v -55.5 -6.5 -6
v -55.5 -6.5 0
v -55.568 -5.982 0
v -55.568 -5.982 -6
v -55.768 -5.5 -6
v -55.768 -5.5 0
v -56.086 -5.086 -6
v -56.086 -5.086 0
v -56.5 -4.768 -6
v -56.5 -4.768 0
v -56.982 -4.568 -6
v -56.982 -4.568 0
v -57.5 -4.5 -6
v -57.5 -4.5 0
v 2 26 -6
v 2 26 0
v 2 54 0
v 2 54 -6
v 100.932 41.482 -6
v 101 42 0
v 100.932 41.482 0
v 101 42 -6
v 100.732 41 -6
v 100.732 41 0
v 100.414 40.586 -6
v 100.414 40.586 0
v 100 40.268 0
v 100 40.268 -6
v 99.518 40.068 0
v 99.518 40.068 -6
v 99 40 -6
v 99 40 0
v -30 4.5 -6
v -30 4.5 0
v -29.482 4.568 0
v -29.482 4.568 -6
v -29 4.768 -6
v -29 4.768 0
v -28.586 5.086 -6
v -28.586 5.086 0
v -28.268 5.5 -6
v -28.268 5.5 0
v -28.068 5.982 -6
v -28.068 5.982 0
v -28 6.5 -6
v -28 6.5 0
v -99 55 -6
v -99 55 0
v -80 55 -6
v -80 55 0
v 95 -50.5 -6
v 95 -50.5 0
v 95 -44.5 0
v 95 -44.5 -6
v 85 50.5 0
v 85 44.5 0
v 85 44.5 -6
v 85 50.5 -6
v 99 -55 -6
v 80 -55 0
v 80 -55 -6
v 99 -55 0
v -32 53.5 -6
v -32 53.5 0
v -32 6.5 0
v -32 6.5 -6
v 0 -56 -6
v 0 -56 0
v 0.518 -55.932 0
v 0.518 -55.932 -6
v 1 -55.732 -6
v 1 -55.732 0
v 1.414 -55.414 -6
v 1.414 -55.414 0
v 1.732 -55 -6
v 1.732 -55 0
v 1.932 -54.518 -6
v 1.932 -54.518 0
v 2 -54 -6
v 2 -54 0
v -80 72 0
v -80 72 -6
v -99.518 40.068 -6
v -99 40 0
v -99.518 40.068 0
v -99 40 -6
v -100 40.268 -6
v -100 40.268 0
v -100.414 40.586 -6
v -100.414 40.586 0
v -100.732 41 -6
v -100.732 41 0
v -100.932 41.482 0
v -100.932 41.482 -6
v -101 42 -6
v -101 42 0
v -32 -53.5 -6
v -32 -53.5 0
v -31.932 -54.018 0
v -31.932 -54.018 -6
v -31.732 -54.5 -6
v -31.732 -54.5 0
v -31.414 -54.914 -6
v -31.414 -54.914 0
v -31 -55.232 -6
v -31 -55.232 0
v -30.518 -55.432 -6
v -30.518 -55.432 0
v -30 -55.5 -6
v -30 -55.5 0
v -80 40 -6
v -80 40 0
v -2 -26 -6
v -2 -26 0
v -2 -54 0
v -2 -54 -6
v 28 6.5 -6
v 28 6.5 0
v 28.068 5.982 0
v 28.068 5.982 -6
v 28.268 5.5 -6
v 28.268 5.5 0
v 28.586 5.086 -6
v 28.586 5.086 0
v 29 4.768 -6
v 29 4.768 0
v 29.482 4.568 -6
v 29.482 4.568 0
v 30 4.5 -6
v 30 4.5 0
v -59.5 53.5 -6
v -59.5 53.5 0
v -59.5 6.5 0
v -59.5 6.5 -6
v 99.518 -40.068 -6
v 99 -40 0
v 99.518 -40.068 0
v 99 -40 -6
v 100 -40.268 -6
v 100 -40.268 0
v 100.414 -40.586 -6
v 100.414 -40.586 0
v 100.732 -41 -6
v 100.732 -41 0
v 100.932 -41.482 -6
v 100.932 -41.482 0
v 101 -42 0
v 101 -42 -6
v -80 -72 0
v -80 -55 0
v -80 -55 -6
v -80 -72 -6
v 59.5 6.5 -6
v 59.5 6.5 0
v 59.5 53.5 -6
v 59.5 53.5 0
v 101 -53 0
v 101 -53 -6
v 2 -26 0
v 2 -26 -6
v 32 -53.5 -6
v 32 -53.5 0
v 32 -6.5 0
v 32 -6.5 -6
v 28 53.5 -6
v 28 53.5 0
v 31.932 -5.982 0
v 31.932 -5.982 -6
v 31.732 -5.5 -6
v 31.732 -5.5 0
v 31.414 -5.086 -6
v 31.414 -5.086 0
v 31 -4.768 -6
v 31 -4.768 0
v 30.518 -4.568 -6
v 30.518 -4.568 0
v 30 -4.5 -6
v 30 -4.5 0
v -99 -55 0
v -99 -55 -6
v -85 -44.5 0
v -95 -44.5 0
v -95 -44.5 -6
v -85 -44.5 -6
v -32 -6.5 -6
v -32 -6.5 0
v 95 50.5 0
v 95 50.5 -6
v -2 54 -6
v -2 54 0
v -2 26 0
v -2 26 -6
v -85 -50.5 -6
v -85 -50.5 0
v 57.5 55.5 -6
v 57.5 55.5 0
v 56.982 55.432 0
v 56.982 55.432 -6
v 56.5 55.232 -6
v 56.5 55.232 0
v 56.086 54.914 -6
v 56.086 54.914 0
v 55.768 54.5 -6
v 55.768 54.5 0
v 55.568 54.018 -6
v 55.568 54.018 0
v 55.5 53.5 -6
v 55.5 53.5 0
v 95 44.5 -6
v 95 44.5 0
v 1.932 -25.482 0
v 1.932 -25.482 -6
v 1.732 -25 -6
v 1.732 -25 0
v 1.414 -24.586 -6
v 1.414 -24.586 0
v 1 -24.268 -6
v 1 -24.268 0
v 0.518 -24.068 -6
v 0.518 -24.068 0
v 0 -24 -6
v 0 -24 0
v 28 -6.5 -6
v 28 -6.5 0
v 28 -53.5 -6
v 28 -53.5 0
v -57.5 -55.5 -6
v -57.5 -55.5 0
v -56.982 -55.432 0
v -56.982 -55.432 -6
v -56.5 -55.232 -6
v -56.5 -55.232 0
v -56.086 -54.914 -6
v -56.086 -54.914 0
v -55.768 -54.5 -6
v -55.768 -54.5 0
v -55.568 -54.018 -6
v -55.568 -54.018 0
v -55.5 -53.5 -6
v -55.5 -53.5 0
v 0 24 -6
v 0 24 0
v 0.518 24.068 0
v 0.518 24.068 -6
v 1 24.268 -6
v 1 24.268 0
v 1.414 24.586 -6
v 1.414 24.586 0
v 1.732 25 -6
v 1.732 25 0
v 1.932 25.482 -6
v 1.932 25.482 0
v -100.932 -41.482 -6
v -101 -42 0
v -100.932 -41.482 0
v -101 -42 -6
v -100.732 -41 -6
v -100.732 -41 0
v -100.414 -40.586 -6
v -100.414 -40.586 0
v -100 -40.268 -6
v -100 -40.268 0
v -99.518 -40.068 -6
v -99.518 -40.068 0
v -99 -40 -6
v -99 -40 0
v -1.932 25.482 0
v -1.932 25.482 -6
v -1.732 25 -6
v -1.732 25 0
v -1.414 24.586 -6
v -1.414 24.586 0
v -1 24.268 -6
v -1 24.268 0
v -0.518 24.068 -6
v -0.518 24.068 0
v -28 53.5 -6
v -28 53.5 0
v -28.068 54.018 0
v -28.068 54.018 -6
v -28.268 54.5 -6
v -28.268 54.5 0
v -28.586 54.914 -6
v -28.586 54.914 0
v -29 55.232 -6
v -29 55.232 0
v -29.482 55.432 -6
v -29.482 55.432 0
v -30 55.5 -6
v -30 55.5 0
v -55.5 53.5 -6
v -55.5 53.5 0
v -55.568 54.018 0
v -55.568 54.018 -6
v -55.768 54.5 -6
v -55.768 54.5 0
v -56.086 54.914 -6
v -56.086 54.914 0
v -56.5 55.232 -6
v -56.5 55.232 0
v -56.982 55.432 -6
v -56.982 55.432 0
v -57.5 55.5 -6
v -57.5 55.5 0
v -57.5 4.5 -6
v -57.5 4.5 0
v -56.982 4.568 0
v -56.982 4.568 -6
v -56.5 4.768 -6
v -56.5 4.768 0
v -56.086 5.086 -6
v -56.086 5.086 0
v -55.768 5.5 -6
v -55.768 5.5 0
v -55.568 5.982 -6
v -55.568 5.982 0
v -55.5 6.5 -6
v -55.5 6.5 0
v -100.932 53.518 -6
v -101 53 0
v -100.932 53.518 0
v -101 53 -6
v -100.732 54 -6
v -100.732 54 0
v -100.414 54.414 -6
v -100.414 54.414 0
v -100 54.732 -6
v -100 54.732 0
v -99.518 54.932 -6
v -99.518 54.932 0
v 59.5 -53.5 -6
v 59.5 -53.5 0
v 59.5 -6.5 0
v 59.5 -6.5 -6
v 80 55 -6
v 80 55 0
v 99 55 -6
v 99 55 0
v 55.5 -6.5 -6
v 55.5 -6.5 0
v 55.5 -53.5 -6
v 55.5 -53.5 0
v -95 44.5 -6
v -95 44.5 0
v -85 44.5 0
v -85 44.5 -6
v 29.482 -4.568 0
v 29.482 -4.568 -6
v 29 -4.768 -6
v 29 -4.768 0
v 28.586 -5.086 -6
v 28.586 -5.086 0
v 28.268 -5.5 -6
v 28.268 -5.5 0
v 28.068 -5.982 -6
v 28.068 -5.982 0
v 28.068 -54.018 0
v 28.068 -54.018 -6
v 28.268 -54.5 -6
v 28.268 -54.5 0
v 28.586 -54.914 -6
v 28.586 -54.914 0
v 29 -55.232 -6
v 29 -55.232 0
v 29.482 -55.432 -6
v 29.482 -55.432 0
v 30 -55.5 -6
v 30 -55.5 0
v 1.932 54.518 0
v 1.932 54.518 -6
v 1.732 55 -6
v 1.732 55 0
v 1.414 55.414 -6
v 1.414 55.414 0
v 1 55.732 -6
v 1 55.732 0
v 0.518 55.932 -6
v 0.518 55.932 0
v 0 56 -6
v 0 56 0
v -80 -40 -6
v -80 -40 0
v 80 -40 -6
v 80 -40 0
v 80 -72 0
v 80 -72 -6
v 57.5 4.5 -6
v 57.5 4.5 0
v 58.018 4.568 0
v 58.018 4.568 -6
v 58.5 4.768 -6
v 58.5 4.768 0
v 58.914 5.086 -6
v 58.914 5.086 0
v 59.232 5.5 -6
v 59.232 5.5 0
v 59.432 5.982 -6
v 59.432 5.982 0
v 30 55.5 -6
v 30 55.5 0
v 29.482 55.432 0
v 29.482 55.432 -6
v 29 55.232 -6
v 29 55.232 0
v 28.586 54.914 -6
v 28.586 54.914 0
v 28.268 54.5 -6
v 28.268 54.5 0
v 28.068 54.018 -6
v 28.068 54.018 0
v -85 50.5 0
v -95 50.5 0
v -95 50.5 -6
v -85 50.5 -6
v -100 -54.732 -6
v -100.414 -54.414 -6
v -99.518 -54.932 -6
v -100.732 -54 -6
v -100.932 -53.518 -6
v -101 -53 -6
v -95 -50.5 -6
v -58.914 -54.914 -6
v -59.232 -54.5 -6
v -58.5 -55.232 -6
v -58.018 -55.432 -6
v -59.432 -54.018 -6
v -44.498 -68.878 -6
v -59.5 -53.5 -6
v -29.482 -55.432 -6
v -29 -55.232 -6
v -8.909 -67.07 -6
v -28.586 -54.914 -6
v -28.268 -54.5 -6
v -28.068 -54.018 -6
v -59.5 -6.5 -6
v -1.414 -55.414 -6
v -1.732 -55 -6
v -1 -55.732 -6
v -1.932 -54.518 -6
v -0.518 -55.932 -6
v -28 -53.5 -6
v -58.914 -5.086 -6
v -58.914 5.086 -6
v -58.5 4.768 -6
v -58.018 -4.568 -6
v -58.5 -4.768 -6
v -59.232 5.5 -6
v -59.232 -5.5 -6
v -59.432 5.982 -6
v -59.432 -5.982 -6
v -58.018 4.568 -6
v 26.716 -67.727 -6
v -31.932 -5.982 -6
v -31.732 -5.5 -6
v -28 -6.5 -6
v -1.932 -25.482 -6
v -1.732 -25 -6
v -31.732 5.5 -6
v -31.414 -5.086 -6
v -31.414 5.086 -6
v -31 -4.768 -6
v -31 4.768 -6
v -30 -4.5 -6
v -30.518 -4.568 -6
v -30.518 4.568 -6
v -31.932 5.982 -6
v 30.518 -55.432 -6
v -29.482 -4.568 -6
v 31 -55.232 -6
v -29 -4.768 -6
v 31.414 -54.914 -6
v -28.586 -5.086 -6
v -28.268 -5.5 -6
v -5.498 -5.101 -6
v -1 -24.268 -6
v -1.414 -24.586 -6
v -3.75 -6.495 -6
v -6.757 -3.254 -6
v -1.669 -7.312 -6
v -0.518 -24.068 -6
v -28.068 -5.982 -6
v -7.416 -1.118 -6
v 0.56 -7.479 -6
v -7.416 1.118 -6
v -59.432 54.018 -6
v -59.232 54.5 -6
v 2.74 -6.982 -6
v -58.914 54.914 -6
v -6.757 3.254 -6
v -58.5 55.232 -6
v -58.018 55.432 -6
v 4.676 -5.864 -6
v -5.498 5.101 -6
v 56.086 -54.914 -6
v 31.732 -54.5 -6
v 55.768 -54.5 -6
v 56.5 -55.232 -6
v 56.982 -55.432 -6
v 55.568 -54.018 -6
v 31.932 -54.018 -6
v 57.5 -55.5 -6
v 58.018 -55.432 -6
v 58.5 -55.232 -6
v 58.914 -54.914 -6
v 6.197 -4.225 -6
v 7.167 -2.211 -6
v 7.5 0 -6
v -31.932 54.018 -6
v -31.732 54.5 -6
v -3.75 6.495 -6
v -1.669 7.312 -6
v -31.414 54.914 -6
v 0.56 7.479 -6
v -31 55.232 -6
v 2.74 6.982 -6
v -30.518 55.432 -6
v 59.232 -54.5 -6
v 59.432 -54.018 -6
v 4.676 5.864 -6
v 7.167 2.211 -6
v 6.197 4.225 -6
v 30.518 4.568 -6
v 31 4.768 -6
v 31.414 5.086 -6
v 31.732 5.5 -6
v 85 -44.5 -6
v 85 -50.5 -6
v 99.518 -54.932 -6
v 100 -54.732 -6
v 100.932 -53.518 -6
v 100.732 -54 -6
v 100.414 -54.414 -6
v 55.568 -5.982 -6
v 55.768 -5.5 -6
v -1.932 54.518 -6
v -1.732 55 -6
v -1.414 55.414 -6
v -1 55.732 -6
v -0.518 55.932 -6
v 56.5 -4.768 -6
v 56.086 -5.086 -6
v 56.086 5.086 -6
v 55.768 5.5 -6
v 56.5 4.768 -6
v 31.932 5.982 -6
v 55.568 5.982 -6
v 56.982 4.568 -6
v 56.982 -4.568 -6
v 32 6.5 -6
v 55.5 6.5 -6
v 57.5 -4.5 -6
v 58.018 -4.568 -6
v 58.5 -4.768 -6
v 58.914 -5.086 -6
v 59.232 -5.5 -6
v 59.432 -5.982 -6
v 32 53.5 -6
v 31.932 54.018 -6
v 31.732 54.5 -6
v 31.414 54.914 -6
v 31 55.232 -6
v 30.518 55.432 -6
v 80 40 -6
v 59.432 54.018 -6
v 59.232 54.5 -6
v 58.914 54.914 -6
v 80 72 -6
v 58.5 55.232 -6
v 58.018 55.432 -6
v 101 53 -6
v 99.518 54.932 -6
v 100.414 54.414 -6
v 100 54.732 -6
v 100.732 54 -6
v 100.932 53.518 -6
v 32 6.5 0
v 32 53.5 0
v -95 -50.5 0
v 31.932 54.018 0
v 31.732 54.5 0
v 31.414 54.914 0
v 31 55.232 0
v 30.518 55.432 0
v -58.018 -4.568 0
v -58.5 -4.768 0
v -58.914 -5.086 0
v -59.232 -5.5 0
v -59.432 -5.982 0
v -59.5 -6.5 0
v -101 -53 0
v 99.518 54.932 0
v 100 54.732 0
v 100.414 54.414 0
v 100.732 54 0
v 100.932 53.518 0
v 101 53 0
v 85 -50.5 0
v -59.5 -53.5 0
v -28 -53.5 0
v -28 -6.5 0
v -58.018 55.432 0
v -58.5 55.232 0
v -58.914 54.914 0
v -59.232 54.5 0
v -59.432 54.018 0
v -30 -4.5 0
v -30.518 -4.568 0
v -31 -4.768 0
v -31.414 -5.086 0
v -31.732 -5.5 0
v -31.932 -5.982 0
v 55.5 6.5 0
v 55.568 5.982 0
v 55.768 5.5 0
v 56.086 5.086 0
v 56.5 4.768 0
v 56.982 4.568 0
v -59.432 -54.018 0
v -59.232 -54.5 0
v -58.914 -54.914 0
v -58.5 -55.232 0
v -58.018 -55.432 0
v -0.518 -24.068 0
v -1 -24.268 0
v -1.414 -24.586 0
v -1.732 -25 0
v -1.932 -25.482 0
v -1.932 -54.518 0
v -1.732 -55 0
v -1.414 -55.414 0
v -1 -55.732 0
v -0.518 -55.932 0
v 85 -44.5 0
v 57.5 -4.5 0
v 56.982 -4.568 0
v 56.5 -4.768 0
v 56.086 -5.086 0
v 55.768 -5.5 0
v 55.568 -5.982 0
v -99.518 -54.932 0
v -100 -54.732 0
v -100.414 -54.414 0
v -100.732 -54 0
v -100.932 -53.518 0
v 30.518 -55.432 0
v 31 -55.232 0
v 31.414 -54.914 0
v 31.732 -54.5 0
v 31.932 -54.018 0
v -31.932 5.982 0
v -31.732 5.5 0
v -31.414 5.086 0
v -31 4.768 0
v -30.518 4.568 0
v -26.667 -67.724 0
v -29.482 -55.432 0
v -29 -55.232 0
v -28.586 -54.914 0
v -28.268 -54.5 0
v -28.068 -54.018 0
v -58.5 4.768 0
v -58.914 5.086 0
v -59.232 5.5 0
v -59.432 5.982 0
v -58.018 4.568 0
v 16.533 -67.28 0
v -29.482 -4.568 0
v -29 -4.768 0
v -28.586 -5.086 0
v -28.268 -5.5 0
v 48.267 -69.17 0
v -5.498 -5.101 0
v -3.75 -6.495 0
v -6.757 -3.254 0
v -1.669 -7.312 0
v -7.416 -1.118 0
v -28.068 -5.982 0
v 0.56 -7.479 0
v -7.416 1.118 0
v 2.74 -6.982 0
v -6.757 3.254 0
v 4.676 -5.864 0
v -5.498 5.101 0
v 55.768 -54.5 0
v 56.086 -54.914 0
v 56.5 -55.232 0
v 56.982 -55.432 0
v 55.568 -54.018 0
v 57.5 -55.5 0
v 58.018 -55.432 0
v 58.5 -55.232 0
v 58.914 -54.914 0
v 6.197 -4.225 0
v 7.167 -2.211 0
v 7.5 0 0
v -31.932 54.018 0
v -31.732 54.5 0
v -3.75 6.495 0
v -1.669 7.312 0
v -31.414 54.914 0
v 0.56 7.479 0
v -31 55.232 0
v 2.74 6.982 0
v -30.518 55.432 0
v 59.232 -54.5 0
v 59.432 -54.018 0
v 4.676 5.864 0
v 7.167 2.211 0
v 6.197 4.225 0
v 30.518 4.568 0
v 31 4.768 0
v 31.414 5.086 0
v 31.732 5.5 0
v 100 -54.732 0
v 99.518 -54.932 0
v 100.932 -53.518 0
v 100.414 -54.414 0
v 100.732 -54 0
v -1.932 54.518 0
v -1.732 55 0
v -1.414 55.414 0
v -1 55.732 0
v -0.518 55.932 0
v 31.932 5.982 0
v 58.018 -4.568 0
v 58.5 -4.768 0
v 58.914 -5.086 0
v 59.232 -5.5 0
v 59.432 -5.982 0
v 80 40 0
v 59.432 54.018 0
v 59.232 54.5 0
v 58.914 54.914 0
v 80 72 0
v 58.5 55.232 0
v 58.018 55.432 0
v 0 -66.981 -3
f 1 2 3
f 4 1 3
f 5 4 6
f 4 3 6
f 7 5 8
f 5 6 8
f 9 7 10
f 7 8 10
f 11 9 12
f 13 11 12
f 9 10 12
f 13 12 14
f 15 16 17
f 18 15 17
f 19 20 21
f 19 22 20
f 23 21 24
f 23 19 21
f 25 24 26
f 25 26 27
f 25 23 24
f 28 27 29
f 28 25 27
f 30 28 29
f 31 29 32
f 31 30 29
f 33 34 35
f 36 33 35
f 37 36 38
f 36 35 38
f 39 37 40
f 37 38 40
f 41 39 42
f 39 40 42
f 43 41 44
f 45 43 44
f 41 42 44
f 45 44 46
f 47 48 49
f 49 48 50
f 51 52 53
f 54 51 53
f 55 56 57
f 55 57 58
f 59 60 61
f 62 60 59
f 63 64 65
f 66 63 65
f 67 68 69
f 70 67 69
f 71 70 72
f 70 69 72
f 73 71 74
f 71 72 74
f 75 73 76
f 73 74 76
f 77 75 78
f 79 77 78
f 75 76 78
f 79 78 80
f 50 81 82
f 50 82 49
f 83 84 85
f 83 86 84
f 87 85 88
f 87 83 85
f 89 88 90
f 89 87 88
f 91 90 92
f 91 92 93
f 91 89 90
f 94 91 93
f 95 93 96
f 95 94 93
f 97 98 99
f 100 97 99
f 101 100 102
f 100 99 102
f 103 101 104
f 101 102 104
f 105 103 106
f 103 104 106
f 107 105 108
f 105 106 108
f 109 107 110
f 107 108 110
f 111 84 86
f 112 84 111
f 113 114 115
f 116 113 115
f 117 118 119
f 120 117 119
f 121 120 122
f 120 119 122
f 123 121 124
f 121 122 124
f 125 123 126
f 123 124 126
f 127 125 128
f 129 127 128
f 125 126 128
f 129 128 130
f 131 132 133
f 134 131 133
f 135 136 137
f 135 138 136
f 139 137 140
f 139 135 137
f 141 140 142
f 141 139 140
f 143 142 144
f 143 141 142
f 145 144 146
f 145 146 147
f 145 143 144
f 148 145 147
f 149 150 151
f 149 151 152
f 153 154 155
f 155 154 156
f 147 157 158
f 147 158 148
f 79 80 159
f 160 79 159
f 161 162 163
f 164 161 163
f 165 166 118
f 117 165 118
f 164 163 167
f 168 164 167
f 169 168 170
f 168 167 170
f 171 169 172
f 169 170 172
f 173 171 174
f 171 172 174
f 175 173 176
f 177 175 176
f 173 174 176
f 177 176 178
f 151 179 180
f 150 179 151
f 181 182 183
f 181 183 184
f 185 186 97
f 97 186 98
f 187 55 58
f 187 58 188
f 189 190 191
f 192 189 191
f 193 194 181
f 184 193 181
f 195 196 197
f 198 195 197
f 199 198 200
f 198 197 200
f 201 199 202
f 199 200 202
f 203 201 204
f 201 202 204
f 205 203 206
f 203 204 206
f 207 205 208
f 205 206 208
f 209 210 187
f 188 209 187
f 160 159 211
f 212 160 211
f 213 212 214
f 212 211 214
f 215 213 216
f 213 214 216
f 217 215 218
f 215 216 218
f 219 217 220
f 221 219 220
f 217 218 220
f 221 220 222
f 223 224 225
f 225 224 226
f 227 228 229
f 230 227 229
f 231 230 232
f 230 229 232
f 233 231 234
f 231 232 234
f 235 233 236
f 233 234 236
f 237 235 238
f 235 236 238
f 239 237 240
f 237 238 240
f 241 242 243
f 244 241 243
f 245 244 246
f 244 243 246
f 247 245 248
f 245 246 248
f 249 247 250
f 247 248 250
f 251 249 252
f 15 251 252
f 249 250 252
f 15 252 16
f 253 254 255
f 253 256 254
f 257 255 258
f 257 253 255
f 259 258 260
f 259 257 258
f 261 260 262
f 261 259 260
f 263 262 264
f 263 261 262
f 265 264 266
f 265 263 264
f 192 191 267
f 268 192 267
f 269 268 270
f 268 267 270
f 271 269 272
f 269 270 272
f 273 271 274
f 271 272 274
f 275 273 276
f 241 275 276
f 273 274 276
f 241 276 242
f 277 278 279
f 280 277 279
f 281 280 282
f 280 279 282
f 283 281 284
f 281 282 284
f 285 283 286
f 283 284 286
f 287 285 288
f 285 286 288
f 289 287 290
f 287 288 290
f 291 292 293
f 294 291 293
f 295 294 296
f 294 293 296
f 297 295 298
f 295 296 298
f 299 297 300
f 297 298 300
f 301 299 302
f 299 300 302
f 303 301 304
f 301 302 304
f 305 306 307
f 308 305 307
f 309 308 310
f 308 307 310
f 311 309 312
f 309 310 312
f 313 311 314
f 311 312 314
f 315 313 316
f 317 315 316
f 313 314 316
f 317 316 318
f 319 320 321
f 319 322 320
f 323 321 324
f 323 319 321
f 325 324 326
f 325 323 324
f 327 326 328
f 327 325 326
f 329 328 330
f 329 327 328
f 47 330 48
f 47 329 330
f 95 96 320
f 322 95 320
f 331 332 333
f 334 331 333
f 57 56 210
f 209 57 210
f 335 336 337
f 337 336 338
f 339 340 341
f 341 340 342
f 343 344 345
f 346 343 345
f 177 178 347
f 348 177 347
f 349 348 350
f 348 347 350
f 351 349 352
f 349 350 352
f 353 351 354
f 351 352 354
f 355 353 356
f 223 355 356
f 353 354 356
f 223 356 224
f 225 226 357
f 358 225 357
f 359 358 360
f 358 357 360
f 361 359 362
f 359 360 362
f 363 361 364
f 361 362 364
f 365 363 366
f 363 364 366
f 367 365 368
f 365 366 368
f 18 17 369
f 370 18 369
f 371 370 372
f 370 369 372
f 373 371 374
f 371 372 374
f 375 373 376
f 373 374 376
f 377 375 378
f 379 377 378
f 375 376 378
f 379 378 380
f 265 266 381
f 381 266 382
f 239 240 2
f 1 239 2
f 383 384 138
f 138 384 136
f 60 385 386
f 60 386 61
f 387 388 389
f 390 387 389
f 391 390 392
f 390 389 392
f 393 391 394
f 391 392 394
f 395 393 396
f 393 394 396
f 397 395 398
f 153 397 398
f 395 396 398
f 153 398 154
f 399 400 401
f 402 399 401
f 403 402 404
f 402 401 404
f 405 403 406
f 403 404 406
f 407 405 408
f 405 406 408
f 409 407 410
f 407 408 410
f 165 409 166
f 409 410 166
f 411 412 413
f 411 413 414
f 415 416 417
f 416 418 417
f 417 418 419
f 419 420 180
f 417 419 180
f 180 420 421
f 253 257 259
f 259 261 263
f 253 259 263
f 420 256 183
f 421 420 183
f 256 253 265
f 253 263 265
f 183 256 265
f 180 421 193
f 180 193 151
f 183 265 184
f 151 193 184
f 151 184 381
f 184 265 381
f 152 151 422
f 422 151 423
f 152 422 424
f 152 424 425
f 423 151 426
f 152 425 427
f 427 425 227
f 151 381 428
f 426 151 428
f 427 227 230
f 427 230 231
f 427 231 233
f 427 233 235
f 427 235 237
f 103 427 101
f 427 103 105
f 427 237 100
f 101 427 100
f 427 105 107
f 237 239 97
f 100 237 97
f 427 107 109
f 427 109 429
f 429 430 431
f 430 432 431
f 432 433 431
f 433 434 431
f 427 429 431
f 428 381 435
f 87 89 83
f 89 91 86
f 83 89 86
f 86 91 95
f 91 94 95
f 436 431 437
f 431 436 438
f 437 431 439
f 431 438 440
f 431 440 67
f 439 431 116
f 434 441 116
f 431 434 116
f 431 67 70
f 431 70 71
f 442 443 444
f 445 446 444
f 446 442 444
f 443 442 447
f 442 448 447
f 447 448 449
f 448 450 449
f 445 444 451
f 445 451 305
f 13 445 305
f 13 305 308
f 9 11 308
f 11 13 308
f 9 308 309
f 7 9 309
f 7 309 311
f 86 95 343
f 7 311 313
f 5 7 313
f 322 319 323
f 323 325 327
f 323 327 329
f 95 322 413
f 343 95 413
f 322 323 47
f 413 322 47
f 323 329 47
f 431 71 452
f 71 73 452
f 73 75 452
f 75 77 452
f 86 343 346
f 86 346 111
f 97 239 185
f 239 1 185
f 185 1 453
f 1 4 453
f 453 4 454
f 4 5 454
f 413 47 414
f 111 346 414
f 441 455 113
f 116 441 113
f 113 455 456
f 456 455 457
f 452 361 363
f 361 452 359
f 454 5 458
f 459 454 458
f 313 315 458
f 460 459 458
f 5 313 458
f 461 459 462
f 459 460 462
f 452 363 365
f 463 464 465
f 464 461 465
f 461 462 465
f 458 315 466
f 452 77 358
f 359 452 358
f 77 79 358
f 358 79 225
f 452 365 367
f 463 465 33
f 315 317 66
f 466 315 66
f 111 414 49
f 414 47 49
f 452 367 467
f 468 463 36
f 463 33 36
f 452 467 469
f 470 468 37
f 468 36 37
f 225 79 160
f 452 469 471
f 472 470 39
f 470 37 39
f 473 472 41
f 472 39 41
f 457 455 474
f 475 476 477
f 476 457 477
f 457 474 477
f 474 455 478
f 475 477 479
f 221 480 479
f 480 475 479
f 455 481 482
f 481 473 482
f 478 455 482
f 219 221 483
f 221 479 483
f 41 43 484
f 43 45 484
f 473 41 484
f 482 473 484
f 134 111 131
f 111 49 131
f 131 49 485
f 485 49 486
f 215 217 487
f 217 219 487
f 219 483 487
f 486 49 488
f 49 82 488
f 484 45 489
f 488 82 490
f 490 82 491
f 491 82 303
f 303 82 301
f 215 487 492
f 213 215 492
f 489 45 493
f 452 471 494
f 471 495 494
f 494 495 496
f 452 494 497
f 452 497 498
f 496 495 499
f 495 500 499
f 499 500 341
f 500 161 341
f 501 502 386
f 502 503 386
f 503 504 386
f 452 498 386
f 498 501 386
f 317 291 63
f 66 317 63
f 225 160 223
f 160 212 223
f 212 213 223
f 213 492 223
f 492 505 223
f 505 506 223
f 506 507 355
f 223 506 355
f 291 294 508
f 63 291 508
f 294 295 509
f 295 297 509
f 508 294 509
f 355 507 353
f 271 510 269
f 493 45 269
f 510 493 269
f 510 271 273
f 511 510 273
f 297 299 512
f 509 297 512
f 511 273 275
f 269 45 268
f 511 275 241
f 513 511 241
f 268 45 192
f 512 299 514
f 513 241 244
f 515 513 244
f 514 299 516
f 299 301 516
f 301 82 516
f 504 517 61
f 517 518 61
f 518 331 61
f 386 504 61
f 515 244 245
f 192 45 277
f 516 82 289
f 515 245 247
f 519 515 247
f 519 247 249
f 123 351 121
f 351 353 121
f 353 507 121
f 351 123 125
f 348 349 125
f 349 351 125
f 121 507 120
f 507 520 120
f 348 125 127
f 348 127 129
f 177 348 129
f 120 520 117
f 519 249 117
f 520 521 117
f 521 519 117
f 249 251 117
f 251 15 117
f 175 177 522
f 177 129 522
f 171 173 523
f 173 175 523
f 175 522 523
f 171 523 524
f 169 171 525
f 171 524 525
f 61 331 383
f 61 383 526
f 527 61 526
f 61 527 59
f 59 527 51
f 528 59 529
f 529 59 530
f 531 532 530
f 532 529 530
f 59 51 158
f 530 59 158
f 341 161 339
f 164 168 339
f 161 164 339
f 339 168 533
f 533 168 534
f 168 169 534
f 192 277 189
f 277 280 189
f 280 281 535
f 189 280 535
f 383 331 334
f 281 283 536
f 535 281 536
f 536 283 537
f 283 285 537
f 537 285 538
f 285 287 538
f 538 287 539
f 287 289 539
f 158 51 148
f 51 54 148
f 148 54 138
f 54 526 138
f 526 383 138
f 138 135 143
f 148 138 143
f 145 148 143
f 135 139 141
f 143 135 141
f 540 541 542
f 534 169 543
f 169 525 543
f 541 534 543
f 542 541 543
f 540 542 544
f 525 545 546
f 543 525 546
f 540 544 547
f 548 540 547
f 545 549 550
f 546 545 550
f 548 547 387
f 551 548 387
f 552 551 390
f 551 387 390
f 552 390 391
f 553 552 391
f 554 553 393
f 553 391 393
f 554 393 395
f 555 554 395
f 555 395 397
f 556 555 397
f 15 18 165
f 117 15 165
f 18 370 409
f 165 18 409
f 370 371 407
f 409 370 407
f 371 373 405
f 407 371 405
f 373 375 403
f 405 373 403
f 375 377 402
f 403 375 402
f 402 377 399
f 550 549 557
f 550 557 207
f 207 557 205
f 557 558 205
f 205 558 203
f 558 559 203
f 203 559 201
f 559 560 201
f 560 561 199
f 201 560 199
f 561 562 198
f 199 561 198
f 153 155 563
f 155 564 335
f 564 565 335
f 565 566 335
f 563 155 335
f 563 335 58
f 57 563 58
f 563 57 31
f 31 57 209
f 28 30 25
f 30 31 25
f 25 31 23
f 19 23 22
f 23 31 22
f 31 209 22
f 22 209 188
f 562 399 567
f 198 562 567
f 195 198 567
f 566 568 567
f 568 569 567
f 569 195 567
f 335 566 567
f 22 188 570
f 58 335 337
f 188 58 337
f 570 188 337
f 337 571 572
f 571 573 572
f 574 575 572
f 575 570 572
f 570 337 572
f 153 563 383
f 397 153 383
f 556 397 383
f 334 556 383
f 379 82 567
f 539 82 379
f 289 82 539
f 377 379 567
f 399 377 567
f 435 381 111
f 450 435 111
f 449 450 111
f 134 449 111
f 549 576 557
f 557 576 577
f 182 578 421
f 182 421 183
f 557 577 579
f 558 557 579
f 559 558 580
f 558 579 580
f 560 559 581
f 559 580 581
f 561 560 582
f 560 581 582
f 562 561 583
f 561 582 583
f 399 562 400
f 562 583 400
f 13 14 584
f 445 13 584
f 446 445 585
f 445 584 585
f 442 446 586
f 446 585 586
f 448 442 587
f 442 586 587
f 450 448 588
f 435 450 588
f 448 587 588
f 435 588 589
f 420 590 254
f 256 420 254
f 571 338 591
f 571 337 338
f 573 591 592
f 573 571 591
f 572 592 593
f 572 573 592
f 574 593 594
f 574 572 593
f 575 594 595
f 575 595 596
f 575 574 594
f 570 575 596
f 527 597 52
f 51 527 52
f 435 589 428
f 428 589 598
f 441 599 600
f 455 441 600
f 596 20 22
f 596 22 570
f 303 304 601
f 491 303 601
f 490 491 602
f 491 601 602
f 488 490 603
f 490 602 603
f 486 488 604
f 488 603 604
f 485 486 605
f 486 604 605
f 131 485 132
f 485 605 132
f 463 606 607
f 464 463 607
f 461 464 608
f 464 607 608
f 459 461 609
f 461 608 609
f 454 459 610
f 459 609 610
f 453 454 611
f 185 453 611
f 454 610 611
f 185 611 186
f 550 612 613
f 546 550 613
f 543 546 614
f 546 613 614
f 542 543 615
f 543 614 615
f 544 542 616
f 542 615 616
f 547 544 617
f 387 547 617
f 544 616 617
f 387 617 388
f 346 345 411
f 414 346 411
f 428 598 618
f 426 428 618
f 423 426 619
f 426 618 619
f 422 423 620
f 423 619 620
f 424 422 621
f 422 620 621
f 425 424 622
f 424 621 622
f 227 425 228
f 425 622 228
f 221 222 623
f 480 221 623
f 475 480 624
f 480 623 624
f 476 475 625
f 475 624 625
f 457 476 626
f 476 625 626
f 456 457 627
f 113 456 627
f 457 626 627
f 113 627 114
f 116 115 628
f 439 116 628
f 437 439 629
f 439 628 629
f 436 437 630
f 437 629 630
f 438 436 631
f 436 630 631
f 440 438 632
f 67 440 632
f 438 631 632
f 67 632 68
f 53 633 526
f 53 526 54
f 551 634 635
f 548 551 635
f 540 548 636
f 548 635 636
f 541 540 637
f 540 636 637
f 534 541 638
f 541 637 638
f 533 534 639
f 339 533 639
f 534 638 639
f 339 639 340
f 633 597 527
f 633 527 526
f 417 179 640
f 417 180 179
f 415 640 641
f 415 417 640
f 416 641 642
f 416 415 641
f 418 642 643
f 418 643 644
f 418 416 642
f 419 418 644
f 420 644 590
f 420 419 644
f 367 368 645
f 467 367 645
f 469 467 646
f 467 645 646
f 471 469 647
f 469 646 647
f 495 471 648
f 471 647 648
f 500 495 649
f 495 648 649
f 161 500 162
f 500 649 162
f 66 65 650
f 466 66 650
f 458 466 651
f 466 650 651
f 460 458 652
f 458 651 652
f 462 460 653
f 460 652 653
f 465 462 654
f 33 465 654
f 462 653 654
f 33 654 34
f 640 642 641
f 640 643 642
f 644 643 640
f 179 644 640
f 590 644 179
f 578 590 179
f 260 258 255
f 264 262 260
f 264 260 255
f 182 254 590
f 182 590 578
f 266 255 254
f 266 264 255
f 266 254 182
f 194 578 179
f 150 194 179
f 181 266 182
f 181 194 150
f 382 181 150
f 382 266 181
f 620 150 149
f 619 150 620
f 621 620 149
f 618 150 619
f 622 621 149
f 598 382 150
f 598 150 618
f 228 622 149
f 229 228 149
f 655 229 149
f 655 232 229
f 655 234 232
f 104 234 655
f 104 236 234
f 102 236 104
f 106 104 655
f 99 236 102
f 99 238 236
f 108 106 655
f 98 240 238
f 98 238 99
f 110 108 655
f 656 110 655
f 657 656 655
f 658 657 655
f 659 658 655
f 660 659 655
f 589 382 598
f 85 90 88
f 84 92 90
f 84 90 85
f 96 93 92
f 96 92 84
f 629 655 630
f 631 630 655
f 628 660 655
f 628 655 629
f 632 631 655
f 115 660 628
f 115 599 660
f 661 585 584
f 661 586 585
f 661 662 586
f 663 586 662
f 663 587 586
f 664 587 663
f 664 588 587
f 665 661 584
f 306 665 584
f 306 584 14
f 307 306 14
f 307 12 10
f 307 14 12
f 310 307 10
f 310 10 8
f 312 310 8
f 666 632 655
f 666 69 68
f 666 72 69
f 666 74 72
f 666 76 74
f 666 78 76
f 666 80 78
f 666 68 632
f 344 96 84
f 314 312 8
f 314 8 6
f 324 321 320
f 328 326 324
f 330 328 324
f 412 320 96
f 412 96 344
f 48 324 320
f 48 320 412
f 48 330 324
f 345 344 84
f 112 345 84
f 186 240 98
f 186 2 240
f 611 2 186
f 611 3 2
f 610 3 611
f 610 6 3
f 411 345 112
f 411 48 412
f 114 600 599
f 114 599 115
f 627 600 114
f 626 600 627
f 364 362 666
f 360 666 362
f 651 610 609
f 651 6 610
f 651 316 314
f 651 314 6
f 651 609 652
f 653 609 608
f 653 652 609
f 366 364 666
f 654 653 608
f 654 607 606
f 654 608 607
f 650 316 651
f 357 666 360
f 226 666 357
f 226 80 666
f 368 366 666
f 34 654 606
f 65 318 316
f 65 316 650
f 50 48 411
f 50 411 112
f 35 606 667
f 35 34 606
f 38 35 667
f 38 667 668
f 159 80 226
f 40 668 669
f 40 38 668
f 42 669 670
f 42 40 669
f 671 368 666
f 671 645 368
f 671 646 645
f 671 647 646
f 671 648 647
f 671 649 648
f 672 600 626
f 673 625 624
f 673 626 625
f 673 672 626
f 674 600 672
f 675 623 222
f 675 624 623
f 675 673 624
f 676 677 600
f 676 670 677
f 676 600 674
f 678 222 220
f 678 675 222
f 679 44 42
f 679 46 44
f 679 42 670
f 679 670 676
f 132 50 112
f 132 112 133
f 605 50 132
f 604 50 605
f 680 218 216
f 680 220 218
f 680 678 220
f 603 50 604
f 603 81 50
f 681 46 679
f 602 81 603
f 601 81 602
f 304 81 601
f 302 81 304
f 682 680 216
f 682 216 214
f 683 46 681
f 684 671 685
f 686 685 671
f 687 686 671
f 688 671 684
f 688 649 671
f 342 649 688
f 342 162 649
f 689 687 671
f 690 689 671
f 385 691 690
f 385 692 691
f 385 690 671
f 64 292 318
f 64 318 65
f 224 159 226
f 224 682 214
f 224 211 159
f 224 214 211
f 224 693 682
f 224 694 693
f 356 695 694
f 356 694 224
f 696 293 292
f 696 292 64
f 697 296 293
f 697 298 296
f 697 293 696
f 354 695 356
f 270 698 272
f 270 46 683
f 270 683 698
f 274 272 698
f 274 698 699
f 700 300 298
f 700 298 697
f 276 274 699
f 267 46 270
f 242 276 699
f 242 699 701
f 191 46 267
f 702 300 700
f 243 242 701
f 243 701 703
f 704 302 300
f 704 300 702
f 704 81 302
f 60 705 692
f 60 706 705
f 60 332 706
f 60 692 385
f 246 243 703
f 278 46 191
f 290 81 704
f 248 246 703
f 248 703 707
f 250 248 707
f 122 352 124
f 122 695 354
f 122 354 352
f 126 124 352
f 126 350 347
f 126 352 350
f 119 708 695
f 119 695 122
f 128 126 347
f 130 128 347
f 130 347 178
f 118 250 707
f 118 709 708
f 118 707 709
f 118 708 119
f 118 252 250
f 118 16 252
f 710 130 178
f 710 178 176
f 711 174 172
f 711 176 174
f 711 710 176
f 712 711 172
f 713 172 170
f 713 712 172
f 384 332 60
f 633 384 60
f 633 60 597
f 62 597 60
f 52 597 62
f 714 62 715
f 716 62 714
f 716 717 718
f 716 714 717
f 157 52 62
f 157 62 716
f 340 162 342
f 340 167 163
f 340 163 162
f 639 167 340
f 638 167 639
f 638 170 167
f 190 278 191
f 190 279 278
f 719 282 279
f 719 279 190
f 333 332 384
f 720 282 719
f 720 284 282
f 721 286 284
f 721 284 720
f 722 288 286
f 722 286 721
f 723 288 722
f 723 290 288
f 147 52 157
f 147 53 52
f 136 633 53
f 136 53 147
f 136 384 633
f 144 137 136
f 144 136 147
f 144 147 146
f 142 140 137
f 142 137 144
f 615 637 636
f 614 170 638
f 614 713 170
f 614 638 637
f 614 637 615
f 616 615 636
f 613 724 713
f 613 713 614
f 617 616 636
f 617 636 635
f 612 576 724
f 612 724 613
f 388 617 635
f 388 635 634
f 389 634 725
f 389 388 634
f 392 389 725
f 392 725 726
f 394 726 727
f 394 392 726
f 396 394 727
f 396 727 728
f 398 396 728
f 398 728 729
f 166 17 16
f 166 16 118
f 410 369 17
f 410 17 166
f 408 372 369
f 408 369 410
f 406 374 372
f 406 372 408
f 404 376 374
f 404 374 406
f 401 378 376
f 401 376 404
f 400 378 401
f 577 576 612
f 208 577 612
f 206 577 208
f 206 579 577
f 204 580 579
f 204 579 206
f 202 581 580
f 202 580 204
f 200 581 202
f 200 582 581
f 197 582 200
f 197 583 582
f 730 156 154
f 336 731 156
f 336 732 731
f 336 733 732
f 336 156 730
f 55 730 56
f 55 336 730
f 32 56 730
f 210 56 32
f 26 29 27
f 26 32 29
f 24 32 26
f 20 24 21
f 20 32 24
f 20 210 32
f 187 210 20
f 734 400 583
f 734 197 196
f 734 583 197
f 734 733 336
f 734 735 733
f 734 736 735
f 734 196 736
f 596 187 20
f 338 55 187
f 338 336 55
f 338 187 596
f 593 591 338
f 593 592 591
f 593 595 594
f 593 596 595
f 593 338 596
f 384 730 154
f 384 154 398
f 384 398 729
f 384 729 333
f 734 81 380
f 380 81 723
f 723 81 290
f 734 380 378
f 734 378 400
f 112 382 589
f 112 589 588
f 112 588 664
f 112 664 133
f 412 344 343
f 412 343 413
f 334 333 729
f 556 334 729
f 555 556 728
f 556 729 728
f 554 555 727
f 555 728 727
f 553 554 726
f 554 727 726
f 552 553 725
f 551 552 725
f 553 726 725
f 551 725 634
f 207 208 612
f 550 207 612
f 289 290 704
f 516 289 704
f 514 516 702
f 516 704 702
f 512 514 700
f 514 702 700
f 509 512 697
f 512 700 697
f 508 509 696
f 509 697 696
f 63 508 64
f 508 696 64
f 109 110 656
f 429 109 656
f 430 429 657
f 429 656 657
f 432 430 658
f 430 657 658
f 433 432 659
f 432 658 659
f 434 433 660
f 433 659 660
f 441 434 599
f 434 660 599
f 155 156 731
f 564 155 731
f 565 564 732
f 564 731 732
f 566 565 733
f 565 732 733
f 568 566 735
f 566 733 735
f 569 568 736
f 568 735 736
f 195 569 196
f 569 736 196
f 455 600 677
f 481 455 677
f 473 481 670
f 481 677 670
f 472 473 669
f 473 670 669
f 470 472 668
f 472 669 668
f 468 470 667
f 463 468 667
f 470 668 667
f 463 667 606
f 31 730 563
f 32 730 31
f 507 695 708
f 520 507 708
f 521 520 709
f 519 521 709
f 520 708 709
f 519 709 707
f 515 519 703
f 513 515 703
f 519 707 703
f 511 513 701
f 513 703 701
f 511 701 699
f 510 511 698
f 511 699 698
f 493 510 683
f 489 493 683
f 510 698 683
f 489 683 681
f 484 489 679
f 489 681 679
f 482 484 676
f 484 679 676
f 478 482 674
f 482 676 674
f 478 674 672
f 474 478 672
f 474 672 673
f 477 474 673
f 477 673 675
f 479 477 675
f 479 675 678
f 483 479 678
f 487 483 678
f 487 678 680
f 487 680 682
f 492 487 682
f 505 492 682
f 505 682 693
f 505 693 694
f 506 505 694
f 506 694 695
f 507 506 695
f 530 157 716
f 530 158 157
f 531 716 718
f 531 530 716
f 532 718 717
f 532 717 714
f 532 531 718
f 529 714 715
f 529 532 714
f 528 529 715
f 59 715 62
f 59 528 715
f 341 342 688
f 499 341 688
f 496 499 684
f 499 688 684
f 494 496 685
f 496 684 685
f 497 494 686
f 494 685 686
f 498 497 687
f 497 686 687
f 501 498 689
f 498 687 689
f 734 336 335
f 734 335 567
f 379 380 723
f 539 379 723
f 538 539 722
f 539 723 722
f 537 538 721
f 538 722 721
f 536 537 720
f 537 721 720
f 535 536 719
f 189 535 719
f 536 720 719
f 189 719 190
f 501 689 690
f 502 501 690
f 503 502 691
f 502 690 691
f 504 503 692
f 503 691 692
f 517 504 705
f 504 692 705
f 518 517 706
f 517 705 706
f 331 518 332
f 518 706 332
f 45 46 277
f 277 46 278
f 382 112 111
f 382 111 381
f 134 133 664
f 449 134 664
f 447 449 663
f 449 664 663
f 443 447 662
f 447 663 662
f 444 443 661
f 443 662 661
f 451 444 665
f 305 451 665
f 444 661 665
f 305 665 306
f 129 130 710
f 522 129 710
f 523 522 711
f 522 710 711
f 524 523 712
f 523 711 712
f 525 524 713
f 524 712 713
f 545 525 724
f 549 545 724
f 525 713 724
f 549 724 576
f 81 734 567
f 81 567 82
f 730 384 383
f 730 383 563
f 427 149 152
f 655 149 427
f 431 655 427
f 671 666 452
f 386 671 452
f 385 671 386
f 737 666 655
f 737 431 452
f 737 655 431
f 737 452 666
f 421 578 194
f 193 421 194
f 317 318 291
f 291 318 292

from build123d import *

# Parameters (mm, degrees)
F1_W     = 21
F1_H     = 15
F2_DEPTH = 6
F0_R     = 7.5
F3_DEPTH = 25
F5_DEPTH = 25
F6_R     = 2
F7_W     = 10
F7_H     = 6
F8_DEPTH = 25


with BuildPart() as f2:
    # F1 (on Top) → F2 (new body)
    with BuildSketch(Plane.XY):
        Polygon((-80, -72), (80, -72), (80, -55), (80, -40), (80, 40), (80, 55), (80, 72), (-80, 72), (-80, 55), (-80, 40), (-80, -40), (-80, -55), align=None)
        with Locations((90.5, -47.5)):
            Rectangle(F1_W, F1_H)
        with Locations((-90.5, -47.5)):
            Rectangle(F1_W, F1_H)
        with Locations((90.5, 47.5)):
            Rectangle(F1_W, F1_H)
        with Locations((-90.5, 47.5)):
            Rectangle(F1_W, F1_H)
    extrude(amount=-F2_DEPTH)

    # F0 (on Top) → F3 (cut)
    with BuildSketch(Plane.XY):
        with BuildLine():
            ThreePointArc((-57.5, 55.5), (-58.9142135624, 54.9142135624), (-59.5, 53.5))
            Line((-59.5, 53.5), (-59.5, 6.5))
            ThreePointArc((-59.5, 6.5), (-58.9142135624, 5.0857864376), (-57.5, 4.5))
            ThreePointArc((-57.5, 4.5), (-56.0857864376, 5.0857864376), (-55.5, 6.5))
            Line((-55.5, 6.5), (-55.5, 53.5))
            ThreePointArc((-55.5, 53.5), (-56.0857864376, 54.9142135624), (-57.5, 55.5))
        make_face()
        with BuildLine():
            ThreePointArc((-59.5, -53.5), (-58.9142135624, -54.9142135624), (-57.5, -55.5))
            ThreePointArc((-57.5, -55.5), (-56.0857864376, -54.9142135624), (-55.5, -53.5))
            Line((-55.5, -53.5), (-55.5, -6.5))
            ThreePointArc((-55.5, -6.5), (-56.0857864376, -5.0857864376), (-57.5, -4.5))
            ThreePointArc((-57.5, -4.5), (-58.9142135624, -5.0857864376), (-59.5, -6.5))
            Line((-59.5, -6.5), (-59.5, -53.5))
        make_face()
        with BuildLine():
            ThreePointArc((-28, 53.5), (-28.5857864376, 54.9142135624), (-30, 55.5))
            ThreePointArc((-30, 55.5), (-31.4142135624, 54.9142135624), (-32, 53.5))
            Line((-32, 53.5), (-32, 6.5))
            ThreePointArc((-32, 6.5), (-31.4142135624, 5.0857864376), (-30, 4.5))
            ThreePointArc((-30, 4.5), (-28.5857864376, 5.0857864376), (-28, 6.5))
            Line((-28, 6.5), (-28, 53.5))
        make_face()
        with BuildLine():
            ThreePointArc((-28, -6.5), (-28.5857864376, -5.0857864376), (-30, -4.5))
            ThreePointArc((-30, -4.5), (-31.4142135624, -5.0857864376), (-32, -6.5))
            Line((-32, -6.5), (-32, -53.5))
            ThreePointArc((-32, -53.5), (-31.4142135624, -54.9142135624), (-30, -55.5))
            ThreePointArc((-30, -55.5), (-28.5857864376, -54.9142135624), (-28, -53.5))
            Line((-28, -53.5), (-28, -6.5))
        make_face()
        Circle(F0_R)
        with BuildLine():
            ThreePointArc((0, 24), (1.4142135624, 24.5857864376), (2, 26))
            Line((2, 26), (2, 54))
            ThreePointArc((2, 54), (1.4142135624, 55.4142135624), (0, 56))
            ThreePointArc((0, 56), (-1.4142135624, 55.4142135624), (-2, 54))
            Line((-2, 54), (-2, 26))
            ThreePointArc((-2, 26), (-1.4142135624, 24.5857864376), (0, 24))
        make_face()
        with BuildLine():
            Line((2, -54), (2, -26))
            ThreePointArc((2, -26), (1.4142135624, -24.5857864376), (0, -24))
            ThreePointArc((0, -24), (-1.4142135624, -24.5857864376), (-2, -26))
            Line((-2, -26), (-2, -54))
            ThreePointArc((-2, -54), (-1.4142135624, -55.4142135624), (0, -56))
            ThreePointArc((0, -56), (1.4142135624, -55.4142135624), (2, -54))
        make_face()
        with BuildLine():
            Line((28, -6.5), (28, -53.5))
            ThreePointArc((28, -53.5), (28.5857864376, -54.9142135624), (30, -55.5))
            ThreePointArc((30, -55.5), (31.4142135624, -54.9142135624), (32, -53.5))
            Line((32, -53.5), (32, -6.5))
            ThreePointArc((32, -6.5), (31.4142135624, -5.0857864376), (30, -4.5))
            ThreePointArc((30, -4.5), (28.5857864376, -5.0857864376), (28, -6.5))
        make_face()
        with BuildLine():
            ThreePointArc((30, 4.5), (31.4142135624, 5.0857864376), (32, 6.5))
            Line((32, 6.5), (32, 53.5))
            ThreePointArc((32, 53.5), (31.4142135624, 54.9142135624), (30, 55.5))
            ThreePointArc((30, 55.5), (28.5857864376, 54.9142135624), (28, 53.5))
            Line((28, 53.5), (28, 6.5))
            ThreePointArc((28, 6.5), (28.5857864376, 5.0857864376), (30, 4.5))
        make_face()
        with BuildLine():
            ThreePointArc((55.5, 6.5), (56.0857864376, 5.0857864376), (57.5, 4.5))
            ThreePointArc((57.5, 4.5), (58.9142135624, 5.0857864376), (59.5, 6.5))
            Line((59.5, 6.5), (59.5, 53.5))
            ThreePointArc((59.5, 53.5), (58.9142135624, 54.9142135624), (57.5, 55.5))
            ThreePointArc((57.5, 55.5), (56.0857864376, 54.9142135624), (55.5, 53.5))
            Line((55.5, 53.5), (55.5, 6.5))
        make_face()
        with BuildLine():
            ThreePointArc((55.5, -53.5), (56.0857864376, -54.9142135624), (57.5, -55.5))
            ThreePointArc((57.5, -55.5), (58.9142135624, -54.9142135624), (59.5, -53.5))
            Line((59.5, -53.5), (59.5, -6.5))
            ThreePointArc((59.5, -6.5), (58.9142135624, -5.0857864376), (57.5, -4.5))
            ThreePointArc((57.5, -4.5), (56.0857864376, -5.0857864376), (55.5, -6.5))
            Line((55.5, -6.5), (55.5, -53.5))
        make_face()
    extrude(amount=-F3_DEPTH, mode=Mode.SUBTRACT)

    # F4 (on face) → F5 (cut)
    with BuildSketch(Plane.XY):
        with BuildLine():
            add(Edge.make_bspline(
                [(-80, -72), (-53.3333333333, -69.4902703762), (0, -64.4708111286), (53.3333333333, -69.4902703762), (80, -72)],
                knots=[0, 0, 0, 0, 0.5, 1, 1, 1, 1], degree=3))
            Line((-80, -72), (-75.6795704365, -86.1006528139))
            Line((-75.6795704365, -86.1006528139), (77.3649588227, -86.1006528139))
            Line((77.3649588227, -86.1006528139), (80, -72))
        make_face()
    extrude(amount=-F5_DEPTH, mode=Mode.SUBTRACT)

    # F6
    f6_edges = [f2.edges().sort_by_distance(p)[0] for p in [
        (-101, 40, -3),
        (-101, 55, -3),
        (-101, -40, -3),
        (-101, -55, -3),
        (101, -55, -3),
        (101, -40, -3),
        (101, 40, -3),
        (101, 55, -3),
    ]]
    fillet(f6_edges, radius=F6_R)

    # F7 (on face) → F8 (cut)
    with BuildSketch(Plane.XY):
        with Locations((-90, 47.5)):
            Rectangle(F7_W, F7_H)
        with Locations((-90, -47.5)):
            Rectangle(F7_W, F7_H)
        with Locations((90, 47.5)):
            Rectangle(F7_W, F7_H)
        with Locations((90, -47.5)):
            Rectangle(F7_W, F7_H)
    extrude(amount=-F8_DEPTH, mode=Mode.SUBTRACT)


solid = f2.part
